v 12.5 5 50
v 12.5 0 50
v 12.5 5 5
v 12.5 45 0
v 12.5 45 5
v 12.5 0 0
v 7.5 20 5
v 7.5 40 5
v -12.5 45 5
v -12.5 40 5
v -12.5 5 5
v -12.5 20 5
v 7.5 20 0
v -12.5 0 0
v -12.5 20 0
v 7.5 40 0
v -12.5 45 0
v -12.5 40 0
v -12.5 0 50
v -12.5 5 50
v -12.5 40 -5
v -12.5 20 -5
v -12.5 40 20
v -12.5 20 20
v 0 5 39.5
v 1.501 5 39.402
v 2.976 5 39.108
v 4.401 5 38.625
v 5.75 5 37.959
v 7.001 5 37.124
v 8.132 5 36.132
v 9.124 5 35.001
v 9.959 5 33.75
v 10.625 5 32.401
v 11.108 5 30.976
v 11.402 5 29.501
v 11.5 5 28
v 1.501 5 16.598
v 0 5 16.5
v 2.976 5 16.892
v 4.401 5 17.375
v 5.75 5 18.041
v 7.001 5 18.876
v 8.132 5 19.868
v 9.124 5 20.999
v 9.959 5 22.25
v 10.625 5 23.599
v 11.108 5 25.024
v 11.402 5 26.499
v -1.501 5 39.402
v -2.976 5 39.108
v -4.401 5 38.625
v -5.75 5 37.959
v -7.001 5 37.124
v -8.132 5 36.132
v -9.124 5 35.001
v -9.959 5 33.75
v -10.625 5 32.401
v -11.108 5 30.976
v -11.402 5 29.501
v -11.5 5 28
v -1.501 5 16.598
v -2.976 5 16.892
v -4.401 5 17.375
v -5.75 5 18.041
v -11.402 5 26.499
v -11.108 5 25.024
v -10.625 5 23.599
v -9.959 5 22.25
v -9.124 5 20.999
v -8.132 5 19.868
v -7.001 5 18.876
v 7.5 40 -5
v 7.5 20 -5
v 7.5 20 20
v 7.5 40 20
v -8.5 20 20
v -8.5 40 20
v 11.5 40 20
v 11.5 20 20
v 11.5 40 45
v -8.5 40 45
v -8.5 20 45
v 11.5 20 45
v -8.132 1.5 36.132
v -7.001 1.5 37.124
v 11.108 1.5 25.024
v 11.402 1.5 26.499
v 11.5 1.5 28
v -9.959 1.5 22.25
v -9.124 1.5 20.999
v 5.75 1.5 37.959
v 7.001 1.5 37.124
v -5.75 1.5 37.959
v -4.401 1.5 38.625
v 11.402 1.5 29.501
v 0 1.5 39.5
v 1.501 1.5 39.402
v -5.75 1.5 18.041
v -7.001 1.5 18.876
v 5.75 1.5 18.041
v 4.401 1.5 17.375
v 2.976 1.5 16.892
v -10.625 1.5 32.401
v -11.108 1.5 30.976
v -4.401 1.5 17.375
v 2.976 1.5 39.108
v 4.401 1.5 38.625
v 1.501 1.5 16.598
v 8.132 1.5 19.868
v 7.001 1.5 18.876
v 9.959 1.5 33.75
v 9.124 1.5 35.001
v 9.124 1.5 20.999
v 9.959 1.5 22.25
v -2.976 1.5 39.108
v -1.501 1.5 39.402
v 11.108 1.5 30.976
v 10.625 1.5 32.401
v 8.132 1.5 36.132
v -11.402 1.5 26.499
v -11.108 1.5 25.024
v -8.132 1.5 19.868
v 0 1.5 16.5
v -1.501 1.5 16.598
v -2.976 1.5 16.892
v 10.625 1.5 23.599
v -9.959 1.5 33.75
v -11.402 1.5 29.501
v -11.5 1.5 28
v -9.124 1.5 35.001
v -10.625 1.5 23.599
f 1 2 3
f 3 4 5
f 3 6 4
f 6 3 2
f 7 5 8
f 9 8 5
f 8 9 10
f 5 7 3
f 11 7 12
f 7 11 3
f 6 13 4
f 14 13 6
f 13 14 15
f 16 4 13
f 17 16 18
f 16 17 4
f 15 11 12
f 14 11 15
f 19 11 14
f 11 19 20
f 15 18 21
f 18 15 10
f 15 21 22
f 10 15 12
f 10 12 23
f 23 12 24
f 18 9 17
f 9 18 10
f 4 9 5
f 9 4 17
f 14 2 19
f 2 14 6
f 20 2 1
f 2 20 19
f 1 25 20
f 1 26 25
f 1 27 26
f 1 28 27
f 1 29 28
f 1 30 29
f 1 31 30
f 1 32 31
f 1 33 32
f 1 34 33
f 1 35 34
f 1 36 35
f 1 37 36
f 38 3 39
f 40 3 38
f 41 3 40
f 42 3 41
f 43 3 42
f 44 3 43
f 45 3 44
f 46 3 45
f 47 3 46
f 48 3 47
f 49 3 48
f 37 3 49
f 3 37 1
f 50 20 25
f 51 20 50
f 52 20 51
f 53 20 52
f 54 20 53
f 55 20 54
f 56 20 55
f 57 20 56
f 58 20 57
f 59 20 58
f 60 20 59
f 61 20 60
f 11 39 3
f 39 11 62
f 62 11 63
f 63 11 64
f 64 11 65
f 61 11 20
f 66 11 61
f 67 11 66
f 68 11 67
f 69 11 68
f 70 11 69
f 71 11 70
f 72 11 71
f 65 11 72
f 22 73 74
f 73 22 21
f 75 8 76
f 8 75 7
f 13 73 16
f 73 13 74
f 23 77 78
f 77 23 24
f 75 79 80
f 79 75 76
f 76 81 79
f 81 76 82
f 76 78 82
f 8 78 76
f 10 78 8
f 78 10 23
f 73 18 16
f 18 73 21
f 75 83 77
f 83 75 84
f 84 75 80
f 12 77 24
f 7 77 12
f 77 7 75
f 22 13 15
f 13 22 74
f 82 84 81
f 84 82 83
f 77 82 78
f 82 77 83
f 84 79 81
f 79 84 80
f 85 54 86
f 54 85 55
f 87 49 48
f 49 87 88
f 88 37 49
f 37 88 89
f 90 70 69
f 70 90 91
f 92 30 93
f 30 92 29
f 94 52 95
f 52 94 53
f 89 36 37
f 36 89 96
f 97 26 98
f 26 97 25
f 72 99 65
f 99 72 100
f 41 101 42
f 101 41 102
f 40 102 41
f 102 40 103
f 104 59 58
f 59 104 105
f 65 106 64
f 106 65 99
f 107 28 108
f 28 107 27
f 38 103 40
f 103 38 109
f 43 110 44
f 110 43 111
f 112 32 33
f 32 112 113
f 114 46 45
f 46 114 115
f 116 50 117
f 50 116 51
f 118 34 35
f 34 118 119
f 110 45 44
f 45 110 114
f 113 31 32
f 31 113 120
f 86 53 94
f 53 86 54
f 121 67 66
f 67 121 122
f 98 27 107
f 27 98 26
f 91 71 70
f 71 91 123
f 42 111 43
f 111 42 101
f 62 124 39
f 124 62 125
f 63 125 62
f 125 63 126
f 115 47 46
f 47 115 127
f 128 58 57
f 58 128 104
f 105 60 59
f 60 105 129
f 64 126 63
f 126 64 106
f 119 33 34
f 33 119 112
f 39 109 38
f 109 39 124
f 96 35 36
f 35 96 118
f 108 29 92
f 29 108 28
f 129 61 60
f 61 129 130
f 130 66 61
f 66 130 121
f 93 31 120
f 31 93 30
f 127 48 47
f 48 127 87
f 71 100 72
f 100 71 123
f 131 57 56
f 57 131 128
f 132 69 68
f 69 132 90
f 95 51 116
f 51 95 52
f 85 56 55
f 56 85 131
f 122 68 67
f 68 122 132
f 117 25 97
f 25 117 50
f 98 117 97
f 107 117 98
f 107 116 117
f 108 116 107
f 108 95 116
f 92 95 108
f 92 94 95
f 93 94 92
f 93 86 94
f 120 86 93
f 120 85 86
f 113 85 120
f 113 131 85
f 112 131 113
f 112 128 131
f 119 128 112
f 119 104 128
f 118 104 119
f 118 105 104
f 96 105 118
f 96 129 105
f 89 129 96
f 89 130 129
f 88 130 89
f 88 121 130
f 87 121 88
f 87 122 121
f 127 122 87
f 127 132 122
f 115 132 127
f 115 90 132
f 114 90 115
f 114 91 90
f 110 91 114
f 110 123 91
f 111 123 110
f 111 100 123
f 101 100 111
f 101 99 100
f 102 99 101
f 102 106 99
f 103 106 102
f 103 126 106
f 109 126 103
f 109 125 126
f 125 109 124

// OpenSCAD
// L-shaped mounting bracket for a NEMA 17 stepper motor (e.g. syringe pump).
// Base plate with two vertical through-holes; vertical motor plate with a
// motor-centring boss hole and a 3 mm screw pattern; two triangular gussets
// flush with the edges. NOVEL general part.
//

base_x   = 25;
base_y   = 45;
base_z   = 5;
screw_h1 = 4.5;
screw_x1 = -17;
screw_y1 = 30;
screw_x2 = 17;
screw_y2 = 30;

motor_x  = 25;
motor_y  = 5;
motor_z  = 50;
boss_h   = 23;
boss_x   = 0;
boss_z   = 28;
screw_h2 = 3.4;
screw_p  = 31;

$fn = 48;

gusset_t = 5;
gusset_y = 20;
gusset_z = 20;

difference() {
    union() {
        translate([-base_x / 2, 0, 0]) cube([base_x, base_y, base_z]);      // base plate
        translate([-motor_x / 2, 0, 0]) cube([motor_x, motor_y, motor_z]);  // motor plate
        translate([-base_x / 2, gusset_y, gusset_z]) rotate([0, 90, 0]) cube([base_x, gusset_y, gusset_z]);  // left gusset
        translate([base_x / 2 - 1, gusset_y, gusset_z]) rotate([0, -90, 0]) cube([base_x, gusset_y, gusset_z]);  // right gusset
    }
    for (x = [screw_x1, screw_x2])
        translate([x, screw_y1 - 1, -1]) cylinder(h = base_z + 2, d = screw_h1);                 // vertical through-holes
    translate([0, motor_y / 2 - 1, boss_z]) rotate([-90, 0, 0]) cylinder(h = motor_y + 2, d = boss_h);  // boss hole
    for (a = [0, 90, 180, 270])
        rotate([0, 0, a]) translate([screw_p / 2, motor_y / 2, boss_z]) cylinder(h = motor_y + 2, d = screw_h2);  // screw holes
}
